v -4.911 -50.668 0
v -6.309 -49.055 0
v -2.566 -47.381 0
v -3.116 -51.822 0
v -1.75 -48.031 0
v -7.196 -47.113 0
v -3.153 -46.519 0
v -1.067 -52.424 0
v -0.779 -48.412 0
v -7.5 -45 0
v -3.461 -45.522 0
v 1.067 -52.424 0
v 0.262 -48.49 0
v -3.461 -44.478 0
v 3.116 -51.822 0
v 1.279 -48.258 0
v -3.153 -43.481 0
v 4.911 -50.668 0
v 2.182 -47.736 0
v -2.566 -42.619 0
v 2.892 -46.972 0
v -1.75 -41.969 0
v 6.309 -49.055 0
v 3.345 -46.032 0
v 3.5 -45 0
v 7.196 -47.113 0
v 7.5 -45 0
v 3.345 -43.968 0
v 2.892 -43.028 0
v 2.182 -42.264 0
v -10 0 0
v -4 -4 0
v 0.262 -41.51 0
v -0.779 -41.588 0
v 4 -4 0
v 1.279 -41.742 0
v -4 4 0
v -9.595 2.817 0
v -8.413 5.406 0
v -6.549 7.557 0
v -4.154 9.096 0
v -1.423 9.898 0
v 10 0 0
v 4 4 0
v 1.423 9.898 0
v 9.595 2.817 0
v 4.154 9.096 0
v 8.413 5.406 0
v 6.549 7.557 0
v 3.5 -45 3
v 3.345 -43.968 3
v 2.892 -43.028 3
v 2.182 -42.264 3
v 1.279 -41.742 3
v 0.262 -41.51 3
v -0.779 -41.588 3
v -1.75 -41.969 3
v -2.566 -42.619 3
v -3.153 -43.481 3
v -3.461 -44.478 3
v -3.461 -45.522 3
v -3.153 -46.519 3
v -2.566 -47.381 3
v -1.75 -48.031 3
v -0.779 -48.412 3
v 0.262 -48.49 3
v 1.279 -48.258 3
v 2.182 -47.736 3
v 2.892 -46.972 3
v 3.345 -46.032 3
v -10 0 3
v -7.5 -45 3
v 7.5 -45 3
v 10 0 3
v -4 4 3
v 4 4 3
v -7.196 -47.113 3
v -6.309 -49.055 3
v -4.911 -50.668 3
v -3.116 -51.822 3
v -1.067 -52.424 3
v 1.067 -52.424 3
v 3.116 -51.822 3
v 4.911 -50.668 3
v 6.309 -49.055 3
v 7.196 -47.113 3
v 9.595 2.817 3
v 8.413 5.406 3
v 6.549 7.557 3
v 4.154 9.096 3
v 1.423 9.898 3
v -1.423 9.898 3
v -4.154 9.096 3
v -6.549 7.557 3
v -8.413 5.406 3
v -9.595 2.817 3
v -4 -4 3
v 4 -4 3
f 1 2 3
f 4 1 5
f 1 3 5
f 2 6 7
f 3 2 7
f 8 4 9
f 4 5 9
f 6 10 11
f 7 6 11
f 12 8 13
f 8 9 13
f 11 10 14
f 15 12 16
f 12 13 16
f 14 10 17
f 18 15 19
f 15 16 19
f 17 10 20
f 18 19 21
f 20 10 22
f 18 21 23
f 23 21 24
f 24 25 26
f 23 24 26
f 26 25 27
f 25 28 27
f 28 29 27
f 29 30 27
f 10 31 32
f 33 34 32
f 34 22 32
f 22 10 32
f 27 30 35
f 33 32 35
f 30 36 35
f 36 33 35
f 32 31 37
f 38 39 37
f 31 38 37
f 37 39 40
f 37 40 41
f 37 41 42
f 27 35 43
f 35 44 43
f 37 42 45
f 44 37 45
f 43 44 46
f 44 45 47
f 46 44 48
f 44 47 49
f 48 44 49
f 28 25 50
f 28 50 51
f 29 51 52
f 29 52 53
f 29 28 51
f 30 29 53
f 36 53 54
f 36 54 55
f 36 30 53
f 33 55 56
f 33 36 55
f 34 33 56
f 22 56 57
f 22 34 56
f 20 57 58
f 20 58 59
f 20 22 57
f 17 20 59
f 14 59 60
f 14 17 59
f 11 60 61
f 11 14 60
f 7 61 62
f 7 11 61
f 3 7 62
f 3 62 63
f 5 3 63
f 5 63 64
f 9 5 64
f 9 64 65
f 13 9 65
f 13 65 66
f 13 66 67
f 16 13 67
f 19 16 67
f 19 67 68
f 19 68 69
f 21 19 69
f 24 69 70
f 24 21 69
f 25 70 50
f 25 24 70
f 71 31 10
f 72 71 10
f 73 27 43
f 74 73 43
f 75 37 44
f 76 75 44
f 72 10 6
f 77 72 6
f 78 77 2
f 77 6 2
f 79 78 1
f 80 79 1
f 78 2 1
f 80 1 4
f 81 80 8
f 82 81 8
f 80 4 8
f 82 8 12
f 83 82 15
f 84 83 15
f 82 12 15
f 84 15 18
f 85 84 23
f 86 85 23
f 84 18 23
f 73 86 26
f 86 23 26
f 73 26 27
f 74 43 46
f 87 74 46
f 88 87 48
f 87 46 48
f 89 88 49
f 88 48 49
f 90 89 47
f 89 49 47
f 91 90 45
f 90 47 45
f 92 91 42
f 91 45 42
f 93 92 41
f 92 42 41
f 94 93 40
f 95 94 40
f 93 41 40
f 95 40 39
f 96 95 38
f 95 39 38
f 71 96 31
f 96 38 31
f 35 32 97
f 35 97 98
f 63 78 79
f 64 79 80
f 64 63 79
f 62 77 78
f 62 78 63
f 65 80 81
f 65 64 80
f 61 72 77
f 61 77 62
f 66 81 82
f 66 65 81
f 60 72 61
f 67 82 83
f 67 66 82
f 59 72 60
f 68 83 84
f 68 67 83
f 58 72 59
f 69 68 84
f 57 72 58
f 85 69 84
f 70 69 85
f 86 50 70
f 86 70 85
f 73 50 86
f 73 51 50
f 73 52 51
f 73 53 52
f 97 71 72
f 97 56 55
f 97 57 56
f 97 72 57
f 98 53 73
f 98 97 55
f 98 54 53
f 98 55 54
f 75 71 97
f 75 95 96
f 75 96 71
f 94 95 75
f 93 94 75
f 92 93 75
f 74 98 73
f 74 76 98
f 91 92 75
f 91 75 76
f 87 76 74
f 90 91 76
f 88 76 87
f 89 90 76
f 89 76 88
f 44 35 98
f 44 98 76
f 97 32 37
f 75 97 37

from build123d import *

# Parameters (mm, degrees)
CROQUIS1_R              = 3.5
CROQUIS1_W              = 8
CROQUIS1_H              = 8
SALIENTE_EXTRUIR1_DEPTH = 3


with BuildPart() as part:
    # Croquis1 → Saliente-Extruir1 (new body)
    with BuildSketch(Plane.XY):
        with BuildLine():
            Line((-10, 0), (-7.5, -45))
            ThreePointArc((-7.5, -45), (0, -52.5), (7.5, -45))
            Line((7.5, -45), (10, 0))
            ThreePointArc((10, 0), (0, 10), (-10, 0))
        make_face()
        with Locations((0, -45)):
            Circle(CROQUIS1_R, mode=Mode.SUBTRACT)
        Rectangle(CROQUIS1_W, CROQUIS1_H, mode=Mode.SUBTRACT)
    extrude(amount=SALIENTE_EXTRUIR1_DEPTH)


solid = part.part
